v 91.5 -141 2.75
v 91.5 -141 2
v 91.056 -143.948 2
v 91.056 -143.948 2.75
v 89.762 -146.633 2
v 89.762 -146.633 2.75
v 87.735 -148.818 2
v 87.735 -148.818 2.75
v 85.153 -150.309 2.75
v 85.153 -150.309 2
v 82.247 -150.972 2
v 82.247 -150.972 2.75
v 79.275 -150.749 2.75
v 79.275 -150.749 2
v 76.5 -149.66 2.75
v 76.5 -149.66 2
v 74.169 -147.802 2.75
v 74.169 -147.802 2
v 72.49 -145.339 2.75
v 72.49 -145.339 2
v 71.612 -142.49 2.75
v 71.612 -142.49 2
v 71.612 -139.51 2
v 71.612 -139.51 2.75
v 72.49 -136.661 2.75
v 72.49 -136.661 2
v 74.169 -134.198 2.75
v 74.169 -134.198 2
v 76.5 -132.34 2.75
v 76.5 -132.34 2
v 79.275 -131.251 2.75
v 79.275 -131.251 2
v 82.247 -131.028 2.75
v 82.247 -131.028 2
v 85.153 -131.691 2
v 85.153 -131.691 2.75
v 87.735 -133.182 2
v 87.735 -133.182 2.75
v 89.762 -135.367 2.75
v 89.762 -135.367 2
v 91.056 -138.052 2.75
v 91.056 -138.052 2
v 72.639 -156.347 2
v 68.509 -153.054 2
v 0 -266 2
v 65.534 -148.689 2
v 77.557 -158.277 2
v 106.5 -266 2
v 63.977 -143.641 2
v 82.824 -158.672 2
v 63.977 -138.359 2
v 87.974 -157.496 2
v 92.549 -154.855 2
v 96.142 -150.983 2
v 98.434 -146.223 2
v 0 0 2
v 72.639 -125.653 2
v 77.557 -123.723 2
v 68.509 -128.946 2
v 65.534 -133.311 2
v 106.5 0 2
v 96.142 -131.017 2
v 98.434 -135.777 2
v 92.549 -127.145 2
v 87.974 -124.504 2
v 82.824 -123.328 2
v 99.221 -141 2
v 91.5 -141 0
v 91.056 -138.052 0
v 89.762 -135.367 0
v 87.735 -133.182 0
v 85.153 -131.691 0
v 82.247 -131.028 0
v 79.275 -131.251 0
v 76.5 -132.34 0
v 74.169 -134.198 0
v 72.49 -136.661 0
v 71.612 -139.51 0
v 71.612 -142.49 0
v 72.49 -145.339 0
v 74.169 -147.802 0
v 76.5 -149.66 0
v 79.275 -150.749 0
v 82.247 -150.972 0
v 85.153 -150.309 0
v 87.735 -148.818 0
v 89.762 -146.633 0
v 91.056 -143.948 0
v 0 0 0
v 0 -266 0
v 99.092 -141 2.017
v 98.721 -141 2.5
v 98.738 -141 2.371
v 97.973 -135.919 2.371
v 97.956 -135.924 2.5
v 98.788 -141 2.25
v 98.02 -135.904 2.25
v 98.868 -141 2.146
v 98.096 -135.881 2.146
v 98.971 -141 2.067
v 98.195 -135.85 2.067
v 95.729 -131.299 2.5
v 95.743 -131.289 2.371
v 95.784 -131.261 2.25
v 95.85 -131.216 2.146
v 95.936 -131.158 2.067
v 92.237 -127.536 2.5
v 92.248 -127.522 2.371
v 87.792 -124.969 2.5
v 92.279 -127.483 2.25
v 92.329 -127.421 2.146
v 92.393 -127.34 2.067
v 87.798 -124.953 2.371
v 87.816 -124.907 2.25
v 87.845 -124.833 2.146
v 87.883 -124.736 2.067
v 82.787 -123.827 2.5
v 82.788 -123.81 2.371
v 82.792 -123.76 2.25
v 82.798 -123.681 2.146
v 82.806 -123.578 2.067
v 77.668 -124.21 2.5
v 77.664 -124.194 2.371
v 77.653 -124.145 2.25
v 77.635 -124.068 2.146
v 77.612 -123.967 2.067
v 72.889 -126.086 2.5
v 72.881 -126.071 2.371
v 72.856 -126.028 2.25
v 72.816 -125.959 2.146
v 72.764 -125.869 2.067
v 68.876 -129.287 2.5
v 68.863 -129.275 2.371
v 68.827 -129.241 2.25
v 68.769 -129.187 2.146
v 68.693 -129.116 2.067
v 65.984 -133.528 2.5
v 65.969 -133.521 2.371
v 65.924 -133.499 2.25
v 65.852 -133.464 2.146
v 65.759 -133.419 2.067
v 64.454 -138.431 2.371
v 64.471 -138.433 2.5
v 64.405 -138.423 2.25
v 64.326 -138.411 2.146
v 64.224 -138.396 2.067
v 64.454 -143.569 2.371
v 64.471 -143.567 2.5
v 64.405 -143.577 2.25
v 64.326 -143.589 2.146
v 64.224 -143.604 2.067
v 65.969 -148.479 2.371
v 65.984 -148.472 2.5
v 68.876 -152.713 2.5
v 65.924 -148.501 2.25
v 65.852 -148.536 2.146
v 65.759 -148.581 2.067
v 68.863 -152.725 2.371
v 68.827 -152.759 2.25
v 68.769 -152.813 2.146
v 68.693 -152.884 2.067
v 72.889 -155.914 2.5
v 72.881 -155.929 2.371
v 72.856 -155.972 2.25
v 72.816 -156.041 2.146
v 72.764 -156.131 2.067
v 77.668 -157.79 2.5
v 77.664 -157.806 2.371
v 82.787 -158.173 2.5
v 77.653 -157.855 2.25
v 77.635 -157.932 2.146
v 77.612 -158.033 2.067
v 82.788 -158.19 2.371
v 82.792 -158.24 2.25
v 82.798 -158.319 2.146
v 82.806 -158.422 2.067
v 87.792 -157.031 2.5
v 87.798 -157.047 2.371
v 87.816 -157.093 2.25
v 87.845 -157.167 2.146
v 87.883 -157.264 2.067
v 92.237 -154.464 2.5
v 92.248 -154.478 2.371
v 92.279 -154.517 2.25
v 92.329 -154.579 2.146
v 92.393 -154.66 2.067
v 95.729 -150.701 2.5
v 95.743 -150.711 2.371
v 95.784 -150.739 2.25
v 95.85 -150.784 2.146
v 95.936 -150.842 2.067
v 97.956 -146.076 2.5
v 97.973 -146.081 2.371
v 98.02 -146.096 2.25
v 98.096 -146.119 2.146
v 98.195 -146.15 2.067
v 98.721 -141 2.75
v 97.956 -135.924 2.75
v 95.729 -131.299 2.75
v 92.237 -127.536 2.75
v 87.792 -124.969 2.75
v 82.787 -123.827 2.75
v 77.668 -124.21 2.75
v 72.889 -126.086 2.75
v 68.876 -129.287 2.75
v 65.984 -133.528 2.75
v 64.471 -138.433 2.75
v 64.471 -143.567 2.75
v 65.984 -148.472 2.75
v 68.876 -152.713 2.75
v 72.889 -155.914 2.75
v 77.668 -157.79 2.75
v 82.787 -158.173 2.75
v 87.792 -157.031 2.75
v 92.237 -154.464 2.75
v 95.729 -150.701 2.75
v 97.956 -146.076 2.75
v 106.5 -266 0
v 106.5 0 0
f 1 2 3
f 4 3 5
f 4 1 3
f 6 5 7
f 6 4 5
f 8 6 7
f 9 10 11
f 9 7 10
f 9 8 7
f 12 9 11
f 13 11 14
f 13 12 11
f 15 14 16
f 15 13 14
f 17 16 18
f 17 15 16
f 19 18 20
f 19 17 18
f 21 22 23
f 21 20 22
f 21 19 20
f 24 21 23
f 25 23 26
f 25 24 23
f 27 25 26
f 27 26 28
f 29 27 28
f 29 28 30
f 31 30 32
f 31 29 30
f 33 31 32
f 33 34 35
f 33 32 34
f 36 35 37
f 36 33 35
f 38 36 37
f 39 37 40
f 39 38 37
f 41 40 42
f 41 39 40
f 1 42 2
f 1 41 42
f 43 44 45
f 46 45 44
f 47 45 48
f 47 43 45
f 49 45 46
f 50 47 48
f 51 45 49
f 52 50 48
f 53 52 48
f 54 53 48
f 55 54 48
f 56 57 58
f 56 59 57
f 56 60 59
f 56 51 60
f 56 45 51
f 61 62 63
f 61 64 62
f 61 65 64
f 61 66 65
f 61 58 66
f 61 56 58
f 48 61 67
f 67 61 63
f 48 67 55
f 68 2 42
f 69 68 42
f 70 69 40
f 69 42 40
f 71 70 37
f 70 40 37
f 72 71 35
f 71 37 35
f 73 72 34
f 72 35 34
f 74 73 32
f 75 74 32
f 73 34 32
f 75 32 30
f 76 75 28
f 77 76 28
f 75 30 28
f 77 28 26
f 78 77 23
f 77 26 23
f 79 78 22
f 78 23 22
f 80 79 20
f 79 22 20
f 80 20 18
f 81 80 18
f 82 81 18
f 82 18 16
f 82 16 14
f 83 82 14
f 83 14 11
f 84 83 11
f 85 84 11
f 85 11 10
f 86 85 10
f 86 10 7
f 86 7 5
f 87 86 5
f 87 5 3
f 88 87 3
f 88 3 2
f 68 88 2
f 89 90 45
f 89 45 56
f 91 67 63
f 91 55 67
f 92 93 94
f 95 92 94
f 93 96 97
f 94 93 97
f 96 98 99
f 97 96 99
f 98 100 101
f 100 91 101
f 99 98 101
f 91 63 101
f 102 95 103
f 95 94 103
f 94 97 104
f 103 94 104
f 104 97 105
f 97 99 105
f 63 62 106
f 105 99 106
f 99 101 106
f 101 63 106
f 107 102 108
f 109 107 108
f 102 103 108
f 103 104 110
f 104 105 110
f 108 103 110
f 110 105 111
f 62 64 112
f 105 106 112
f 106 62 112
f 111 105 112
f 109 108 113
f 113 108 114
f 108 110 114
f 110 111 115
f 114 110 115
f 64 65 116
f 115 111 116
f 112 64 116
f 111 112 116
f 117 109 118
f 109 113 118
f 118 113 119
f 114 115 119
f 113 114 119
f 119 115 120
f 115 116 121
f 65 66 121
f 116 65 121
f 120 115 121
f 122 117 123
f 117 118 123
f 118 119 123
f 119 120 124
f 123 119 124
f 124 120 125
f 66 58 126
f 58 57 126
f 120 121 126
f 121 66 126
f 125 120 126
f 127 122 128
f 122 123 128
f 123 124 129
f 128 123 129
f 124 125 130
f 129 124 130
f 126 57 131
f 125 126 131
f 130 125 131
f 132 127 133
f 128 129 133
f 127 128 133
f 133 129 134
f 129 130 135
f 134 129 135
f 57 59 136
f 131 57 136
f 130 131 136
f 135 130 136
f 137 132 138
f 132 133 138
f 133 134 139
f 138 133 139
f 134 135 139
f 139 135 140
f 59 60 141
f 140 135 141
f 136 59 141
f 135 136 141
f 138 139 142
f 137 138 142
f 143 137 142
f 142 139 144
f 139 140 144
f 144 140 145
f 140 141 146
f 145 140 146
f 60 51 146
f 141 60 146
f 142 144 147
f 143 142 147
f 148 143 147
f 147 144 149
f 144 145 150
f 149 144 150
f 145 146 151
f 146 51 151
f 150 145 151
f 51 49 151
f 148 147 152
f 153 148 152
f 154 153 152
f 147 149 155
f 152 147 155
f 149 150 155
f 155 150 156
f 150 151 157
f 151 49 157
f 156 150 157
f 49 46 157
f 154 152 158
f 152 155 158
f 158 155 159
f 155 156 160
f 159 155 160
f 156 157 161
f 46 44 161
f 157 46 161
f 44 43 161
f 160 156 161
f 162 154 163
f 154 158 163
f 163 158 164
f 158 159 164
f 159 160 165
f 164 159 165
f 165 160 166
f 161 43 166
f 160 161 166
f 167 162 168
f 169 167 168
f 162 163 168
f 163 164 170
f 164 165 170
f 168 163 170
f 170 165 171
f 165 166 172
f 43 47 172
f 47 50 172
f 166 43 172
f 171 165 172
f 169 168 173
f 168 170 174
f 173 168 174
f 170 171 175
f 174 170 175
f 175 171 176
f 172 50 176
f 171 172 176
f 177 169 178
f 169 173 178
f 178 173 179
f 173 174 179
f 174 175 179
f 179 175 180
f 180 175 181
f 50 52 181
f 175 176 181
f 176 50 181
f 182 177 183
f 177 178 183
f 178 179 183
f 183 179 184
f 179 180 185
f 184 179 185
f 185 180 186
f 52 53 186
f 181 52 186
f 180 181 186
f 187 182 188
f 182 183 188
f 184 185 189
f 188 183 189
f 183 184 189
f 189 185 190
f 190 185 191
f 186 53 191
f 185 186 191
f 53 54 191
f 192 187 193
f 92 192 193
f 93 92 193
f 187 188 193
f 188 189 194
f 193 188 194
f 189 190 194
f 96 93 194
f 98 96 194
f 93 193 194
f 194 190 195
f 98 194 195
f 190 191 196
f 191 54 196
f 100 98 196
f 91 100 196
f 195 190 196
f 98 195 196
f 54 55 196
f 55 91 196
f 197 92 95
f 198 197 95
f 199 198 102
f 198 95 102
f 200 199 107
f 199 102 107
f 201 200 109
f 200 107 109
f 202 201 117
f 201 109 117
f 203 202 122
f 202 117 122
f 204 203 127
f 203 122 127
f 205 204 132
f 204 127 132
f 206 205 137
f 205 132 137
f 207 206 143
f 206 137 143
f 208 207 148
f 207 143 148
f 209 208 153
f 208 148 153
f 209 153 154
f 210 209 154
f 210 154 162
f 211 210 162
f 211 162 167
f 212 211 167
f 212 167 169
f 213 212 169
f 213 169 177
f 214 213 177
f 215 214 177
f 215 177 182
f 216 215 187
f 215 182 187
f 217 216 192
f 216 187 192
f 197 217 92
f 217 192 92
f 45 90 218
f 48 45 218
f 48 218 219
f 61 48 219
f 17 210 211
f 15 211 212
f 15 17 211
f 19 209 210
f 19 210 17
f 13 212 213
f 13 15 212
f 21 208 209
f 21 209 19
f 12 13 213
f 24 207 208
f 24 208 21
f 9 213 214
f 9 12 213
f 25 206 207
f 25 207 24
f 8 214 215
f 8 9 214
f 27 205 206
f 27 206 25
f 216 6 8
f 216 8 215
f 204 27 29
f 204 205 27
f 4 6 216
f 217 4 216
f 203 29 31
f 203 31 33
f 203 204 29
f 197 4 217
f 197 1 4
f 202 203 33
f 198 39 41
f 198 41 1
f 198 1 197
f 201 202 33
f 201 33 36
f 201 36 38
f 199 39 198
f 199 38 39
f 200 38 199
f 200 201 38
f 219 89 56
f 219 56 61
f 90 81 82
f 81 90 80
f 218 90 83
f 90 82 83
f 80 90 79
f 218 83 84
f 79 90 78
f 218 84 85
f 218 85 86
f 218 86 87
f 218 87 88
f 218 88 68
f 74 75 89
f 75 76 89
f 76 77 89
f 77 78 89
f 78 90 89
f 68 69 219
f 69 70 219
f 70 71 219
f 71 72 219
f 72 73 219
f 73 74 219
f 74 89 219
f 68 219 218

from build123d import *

# Parameters (mm, degrees)
SKETCH1_W           = 106.5
SKETCH1_H           = 266
BOSS_EXTRUDE1_DEPTH = 2
SKETCH2_R           = 10
CUT_EXTRUDE1_DEPTH  = 10
SKETCH5_R           = 17.221351736
BOSS_EXTRUDE3_DEPTH = 0.75
FILLET2_R           = 0.5
CUT_EXTRUDE3_START  = -0.75
SKETCH6_R           = 10
CUT_EXTRUDE3_DEPTH  = 0.75


with BuildPart() as part:
    # Sketch1 → Boss-Extrude1 (new body)
    with BuildSketch(Plane.XY):
        with Locations((53.25, -133)):
            Rectangle(SKETCH1_W, SKETCH1_H)
    extrude(amount=BOSS_EXTRUDE1_DEPTH)

    # Sketch2 → Cut-Extrude1 (cut)
    with BuildSketch(Plane.XY.offset(2)):
        with Locations((81.5, -141)):
            Circle(SKETCH2_R)
    extrude(amount=-CUT_EXTRUDE1_DEPTH, mode=Mode.SUBTRACT)

    # Sketch5 → Boss-Extrude3 (add)
    with BuildSketch(Plane.XY.offset(2)):
        with Locations((81.5, -141)):
            Circle(SKETCH5_R)
    extrude(amount=BOSS_EXTRUDE3_DEPTH)

    # Fillet2
    fillet2_edges = [part.edges().sort_by_distance(p)[0] for p in [
        (64.278648264, -141, 2),
    ]]
    fillet(fillet2_edges, radius=FILLET2_R)

    # Sketch6 → Cut-Extrude3 (cut)
    with BuildSketch(Plane(origin=(0, 0, 2), x_dir=(-1, 0, 0), z_dir=(0, 0, -1)).offset(CUT_EXTRUDE3_START)):
        with Locations(Location((-81.5, -141, 0), (0, 0, 180))):
            Circle(SKETCH6_R)
    extrude(amount=CUT_EXTRUDE3_DEPTH, mode=Mode.SUBTRACT)


solid = part.part
